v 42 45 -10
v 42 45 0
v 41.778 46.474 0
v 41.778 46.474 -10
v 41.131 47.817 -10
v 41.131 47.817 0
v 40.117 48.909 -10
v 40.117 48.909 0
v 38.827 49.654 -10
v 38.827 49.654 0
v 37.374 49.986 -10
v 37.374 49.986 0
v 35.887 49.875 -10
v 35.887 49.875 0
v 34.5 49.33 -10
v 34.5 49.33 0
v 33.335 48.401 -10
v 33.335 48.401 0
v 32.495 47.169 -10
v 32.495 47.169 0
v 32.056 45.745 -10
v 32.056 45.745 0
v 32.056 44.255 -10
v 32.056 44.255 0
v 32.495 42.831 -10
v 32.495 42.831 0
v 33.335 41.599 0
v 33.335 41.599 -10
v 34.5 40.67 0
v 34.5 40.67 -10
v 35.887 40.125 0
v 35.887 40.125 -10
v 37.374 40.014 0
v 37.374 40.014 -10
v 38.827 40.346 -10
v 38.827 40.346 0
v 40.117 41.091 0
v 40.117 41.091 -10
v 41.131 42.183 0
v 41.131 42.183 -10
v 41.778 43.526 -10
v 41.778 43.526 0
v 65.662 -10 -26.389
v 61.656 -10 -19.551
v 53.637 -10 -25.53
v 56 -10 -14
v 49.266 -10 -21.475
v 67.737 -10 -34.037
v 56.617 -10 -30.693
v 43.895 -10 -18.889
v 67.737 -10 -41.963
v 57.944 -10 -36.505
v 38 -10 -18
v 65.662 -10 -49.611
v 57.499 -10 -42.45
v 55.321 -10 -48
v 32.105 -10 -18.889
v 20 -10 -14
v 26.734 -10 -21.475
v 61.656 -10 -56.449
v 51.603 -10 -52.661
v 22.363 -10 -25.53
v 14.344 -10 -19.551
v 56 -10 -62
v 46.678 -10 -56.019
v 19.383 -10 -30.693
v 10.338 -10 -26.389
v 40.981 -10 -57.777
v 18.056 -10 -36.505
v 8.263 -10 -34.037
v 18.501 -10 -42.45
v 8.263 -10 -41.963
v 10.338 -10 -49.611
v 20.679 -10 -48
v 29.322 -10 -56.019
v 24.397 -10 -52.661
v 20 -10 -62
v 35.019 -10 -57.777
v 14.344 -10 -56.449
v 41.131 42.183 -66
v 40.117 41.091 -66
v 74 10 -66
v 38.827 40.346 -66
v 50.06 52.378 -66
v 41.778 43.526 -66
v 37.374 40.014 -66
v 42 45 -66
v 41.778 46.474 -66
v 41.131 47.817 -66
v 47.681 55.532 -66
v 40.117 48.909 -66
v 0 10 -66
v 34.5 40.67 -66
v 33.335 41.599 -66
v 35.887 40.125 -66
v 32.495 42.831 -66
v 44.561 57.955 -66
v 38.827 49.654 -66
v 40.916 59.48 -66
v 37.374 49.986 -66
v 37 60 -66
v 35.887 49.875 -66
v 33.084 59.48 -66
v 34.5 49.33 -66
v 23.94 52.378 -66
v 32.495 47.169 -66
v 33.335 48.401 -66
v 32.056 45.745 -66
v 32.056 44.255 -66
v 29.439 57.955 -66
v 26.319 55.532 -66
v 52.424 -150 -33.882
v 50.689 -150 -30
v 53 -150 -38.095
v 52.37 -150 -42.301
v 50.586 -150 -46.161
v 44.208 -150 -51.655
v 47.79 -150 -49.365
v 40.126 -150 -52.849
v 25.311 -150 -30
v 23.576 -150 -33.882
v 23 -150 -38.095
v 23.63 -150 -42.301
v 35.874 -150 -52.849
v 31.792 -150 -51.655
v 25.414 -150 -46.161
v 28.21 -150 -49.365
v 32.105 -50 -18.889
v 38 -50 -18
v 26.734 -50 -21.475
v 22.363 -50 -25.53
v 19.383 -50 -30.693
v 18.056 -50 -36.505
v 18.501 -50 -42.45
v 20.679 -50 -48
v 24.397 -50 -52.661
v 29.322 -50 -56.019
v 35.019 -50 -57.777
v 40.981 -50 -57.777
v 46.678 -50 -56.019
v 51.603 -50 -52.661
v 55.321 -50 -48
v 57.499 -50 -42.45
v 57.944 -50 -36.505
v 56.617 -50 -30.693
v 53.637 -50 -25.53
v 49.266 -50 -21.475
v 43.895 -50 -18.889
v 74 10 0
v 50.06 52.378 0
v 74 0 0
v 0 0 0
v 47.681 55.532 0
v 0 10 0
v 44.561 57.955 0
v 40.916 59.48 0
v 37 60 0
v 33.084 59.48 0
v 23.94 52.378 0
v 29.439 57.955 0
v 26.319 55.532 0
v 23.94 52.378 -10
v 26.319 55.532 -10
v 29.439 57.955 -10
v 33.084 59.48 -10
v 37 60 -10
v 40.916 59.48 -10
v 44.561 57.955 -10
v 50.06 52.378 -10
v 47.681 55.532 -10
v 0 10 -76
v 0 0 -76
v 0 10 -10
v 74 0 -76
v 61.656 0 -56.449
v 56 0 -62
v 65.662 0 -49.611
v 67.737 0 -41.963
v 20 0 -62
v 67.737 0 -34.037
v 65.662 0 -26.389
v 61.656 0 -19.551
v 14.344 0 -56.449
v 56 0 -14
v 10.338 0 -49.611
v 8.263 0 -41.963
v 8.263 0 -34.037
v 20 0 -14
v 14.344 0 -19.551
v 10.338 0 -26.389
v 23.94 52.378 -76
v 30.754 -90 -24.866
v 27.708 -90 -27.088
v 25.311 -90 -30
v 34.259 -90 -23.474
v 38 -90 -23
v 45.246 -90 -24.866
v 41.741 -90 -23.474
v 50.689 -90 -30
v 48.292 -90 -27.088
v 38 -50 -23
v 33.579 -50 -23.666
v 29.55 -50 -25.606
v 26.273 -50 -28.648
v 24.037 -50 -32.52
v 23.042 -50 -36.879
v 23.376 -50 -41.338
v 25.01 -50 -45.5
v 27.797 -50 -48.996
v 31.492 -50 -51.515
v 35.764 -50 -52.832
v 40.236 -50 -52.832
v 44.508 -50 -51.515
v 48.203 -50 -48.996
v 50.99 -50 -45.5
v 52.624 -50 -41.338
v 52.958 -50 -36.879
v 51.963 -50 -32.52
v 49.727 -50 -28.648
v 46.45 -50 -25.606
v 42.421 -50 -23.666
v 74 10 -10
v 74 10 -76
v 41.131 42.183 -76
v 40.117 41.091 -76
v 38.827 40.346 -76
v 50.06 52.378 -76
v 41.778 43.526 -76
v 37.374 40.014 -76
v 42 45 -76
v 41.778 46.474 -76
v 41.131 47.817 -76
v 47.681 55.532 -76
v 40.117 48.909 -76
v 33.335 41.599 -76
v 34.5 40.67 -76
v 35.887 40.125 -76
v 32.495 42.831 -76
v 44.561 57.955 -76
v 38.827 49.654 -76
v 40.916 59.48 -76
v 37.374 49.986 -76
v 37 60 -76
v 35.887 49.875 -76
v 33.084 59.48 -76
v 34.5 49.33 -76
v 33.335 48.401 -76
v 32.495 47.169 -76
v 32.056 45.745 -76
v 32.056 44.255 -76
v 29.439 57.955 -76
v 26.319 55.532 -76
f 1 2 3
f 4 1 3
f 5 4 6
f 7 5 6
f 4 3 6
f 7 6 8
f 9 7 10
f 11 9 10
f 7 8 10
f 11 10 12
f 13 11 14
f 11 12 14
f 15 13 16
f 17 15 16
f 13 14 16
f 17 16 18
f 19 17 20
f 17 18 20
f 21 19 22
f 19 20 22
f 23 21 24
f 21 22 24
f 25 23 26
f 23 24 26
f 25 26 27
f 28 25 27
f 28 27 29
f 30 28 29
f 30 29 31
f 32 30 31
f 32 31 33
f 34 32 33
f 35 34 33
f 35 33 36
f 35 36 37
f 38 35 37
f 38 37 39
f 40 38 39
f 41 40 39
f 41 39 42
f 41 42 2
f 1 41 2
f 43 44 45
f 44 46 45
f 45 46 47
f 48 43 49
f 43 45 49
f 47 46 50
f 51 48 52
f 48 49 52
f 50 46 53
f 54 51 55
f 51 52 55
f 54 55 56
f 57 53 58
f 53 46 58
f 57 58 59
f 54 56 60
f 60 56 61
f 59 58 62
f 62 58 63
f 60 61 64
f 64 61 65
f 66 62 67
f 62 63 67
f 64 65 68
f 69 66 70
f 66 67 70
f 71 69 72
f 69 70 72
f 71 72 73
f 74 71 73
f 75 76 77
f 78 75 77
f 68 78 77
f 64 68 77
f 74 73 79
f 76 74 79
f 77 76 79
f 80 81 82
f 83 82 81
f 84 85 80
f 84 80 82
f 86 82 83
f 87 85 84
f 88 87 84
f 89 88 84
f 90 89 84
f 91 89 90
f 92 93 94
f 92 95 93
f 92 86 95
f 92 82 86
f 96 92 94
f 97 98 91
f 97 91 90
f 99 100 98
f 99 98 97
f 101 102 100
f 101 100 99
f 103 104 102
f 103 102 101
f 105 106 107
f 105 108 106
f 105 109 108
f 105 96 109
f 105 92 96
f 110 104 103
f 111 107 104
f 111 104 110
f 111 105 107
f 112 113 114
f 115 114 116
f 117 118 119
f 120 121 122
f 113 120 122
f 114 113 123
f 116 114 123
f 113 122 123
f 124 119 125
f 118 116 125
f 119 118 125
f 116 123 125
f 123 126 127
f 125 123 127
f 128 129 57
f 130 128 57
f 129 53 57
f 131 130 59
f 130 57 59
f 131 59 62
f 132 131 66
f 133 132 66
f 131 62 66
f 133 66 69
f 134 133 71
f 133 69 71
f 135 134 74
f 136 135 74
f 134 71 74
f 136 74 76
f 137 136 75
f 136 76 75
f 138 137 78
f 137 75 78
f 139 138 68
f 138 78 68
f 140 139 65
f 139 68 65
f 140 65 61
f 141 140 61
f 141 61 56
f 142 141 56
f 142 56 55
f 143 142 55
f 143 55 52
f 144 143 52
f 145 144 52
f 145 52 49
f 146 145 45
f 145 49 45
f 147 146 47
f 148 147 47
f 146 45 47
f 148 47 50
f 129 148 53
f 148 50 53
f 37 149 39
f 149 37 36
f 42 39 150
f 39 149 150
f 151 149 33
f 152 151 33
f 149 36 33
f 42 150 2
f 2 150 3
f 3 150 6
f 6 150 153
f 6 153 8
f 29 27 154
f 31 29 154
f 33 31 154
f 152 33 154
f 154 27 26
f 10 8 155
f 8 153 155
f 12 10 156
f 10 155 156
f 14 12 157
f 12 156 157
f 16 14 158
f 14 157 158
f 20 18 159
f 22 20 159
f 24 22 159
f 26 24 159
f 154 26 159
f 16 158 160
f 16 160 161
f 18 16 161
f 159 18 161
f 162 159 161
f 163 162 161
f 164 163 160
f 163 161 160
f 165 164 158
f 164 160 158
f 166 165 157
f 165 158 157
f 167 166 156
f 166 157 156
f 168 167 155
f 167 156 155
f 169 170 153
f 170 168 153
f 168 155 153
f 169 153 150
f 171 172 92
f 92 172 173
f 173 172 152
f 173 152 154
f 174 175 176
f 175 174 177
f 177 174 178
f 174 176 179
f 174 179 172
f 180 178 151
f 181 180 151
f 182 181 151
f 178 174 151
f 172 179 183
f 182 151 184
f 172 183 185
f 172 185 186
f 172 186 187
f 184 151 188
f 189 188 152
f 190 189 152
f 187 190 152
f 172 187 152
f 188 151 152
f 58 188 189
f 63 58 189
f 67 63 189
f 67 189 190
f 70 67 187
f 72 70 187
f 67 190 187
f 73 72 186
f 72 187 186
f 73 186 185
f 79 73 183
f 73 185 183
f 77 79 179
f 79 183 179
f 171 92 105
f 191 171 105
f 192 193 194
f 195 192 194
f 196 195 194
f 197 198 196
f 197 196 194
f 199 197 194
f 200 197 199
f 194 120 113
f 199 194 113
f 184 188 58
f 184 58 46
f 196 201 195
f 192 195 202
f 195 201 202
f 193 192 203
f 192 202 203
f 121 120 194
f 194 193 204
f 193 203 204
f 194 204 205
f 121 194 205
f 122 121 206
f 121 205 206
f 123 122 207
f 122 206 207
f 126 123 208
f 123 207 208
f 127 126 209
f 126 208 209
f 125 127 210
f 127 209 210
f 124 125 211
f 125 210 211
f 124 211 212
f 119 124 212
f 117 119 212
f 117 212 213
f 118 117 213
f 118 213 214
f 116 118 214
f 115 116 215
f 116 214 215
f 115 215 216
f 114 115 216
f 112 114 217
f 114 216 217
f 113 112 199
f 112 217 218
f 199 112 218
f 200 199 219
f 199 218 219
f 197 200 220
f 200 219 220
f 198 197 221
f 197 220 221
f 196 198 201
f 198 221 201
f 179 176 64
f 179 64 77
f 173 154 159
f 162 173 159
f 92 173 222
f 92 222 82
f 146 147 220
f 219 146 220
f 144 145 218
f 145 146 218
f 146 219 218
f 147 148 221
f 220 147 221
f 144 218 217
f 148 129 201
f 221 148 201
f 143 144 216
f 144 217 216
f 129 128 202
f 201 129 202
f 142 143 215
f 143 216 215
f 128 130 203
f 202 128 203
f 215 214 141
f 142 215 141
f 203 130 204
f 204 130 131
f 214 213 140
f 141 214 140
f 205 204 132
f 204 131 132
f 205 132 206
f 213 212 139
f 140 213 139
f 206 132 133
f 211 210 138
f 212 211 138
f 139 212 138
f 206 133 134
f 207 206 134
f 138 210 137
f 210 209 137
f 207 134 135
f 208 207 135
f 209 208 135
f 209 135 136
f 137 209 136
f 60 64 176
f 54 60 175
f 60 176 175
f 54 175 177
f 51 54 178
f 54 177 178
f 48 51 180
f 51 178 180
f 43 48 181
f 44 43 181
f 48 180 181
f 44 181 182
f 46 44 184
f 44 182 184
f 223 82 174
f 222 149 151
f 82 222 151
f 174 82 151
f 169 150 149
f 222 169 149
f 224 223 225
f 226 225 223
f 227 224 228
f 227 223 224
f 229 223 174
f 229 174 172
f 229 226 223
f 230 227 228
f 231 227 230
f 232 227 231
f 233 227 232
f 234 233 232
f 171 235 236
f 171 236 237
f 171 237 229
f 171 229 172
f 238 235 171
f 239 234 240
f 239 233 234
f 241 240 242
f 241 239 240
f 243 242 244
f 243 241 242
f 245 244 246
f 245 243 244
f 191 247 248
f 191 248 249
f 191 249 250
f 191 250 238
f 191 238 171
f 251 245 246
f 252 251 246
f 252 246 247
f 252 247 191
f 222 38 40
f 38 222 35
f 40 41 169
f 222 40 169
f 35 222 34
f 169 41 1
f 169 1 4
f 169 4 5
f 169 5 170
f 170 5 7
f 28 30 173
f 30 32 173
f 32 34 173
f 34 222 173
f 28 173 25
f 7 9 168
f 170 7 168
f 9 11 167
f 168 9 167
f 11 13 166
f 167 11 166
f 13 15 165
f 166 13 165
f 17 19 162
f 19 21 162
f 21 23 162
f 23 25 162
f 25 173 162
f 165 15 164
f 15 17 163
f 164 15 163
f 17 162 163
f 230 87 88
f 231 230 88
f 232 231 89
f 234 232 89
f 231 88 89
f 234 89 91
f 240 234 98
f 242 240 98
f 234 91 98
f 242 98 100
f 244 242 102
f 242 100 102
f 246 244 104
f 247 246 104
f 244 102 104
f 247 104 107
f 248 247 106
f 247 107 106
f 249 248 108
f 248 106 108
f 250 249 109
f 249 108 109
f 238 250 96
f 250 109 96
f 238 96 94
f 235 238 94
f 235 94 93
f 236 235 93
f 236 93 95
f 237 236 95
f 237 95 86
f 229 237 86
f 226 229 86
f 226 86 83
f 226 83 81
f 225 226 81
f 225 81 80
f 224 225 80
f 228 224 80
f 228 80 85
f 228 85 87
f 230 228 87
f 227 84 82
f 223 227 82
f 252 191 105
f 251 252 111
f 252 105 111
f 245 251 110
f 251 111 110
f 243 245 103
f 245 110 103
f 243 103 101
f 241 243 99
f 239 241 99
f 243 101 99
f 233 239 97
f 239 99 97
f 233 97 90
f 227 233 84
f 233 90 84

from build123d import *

# Parameters (mm, degrees)
SKETCH1_R           = 5
BOSS_EXTRUDE1_DEPTH = 76
SKETCH2_W           = 56
SKETCH2_H           = 51.048659901
CUT_EXTRUDE1_DEPTH  = 128
CUT_EXTRUDE2_START  = -10
CUT_EXTRUDE2_DEPTH  = 10
CUT_EXTRUDE3_DEPTH  = 60


with BuildPart() as part:
    # Sketch1 → Boss-Extrude1 (new body)
    with BuildSketch(Plane.XY):
        with BuildLine():
            Line((0, 0), (0, 10))
            Line((0, 10), (23.939862606, 52.377859531))
            ThreePointArc((23.939862606, 52.377859531), (36.99996154, 60), (50.06009956, 52.377926503))
            Line((50.06009956, 52.377926503), (74.000286667, 10))
            Line((74.000286667, 10), (74.000286667, 0))
            Line((74.000286667, 0), (0, 0))
        make_face()
        with Locations((37, 45)):
            Circle(SKETCH1_R, mode=Mode.SUBTRACT)
    extrude(amount=-BOSS_EXTRUDE1_DEPTH)

    # Sketch2 → Cut-Extrude1 (cut)
    with BuildSketch(Plane(origin=(0, 0, 0), x_dir=(0, 0, -1), z_dir=(1, 0, 0))):
        with Locations((38, 35.524329951)):
            Rectangle(SKETCH2_W, SKETCH2_H)
    extrude(amount=CUT_EXTRUDE1_DEPTH, mode=Mode.SUBTRACT)

    # Sketch6 → Revolve2 (revolve)
    with BuildSketch(Plane.ZY.offset(-38)):
        Polygon((-18, -10), (-8, -10), (-8, 0), (-38, 0), (-38, -150), (-23, -150), (-23, -50), (-18, -50), align=None)
    revolve(axis=Axis((38, 0, -38), (0, -1, 0)))

    # Sketch8 → Cut-Extrude2 (cut)
    with BuildSketch(Plane.XZ.offset(10).offset(CUT_EXTRUDE2_START)):
        with BuildLine():
            Line((56, -62), (20, -62))
            ThreePointArc((20, -62), (38, -68), (56, -62))
        make_face()
        with BuildLine():
            ThreePointArc((56, -14), (38, -8), (20, -14))
            Line((20, -14), (56, -14))
        make_face()
    extrude(amount=CUT_EXTRUDE2_DEPTH, mode=Mode.SUBTRACT)

    # Sketch9 → Cut-Extrude3 (cut)
    with BuildSketch(Plane.XZ.offset(150)):
        Polygon((-121.587546026, -30), (25.31142246, -30), (50.68857754, -30), (197.587546026, -30), (197.587546026, 263.79793697), (-121.587546026, 263.79793697), align=None)
    extrude(amount=-CUT_EXTRUDE3_DEPTH, mode=Mode.SUBTRACT)


solid = part.part
